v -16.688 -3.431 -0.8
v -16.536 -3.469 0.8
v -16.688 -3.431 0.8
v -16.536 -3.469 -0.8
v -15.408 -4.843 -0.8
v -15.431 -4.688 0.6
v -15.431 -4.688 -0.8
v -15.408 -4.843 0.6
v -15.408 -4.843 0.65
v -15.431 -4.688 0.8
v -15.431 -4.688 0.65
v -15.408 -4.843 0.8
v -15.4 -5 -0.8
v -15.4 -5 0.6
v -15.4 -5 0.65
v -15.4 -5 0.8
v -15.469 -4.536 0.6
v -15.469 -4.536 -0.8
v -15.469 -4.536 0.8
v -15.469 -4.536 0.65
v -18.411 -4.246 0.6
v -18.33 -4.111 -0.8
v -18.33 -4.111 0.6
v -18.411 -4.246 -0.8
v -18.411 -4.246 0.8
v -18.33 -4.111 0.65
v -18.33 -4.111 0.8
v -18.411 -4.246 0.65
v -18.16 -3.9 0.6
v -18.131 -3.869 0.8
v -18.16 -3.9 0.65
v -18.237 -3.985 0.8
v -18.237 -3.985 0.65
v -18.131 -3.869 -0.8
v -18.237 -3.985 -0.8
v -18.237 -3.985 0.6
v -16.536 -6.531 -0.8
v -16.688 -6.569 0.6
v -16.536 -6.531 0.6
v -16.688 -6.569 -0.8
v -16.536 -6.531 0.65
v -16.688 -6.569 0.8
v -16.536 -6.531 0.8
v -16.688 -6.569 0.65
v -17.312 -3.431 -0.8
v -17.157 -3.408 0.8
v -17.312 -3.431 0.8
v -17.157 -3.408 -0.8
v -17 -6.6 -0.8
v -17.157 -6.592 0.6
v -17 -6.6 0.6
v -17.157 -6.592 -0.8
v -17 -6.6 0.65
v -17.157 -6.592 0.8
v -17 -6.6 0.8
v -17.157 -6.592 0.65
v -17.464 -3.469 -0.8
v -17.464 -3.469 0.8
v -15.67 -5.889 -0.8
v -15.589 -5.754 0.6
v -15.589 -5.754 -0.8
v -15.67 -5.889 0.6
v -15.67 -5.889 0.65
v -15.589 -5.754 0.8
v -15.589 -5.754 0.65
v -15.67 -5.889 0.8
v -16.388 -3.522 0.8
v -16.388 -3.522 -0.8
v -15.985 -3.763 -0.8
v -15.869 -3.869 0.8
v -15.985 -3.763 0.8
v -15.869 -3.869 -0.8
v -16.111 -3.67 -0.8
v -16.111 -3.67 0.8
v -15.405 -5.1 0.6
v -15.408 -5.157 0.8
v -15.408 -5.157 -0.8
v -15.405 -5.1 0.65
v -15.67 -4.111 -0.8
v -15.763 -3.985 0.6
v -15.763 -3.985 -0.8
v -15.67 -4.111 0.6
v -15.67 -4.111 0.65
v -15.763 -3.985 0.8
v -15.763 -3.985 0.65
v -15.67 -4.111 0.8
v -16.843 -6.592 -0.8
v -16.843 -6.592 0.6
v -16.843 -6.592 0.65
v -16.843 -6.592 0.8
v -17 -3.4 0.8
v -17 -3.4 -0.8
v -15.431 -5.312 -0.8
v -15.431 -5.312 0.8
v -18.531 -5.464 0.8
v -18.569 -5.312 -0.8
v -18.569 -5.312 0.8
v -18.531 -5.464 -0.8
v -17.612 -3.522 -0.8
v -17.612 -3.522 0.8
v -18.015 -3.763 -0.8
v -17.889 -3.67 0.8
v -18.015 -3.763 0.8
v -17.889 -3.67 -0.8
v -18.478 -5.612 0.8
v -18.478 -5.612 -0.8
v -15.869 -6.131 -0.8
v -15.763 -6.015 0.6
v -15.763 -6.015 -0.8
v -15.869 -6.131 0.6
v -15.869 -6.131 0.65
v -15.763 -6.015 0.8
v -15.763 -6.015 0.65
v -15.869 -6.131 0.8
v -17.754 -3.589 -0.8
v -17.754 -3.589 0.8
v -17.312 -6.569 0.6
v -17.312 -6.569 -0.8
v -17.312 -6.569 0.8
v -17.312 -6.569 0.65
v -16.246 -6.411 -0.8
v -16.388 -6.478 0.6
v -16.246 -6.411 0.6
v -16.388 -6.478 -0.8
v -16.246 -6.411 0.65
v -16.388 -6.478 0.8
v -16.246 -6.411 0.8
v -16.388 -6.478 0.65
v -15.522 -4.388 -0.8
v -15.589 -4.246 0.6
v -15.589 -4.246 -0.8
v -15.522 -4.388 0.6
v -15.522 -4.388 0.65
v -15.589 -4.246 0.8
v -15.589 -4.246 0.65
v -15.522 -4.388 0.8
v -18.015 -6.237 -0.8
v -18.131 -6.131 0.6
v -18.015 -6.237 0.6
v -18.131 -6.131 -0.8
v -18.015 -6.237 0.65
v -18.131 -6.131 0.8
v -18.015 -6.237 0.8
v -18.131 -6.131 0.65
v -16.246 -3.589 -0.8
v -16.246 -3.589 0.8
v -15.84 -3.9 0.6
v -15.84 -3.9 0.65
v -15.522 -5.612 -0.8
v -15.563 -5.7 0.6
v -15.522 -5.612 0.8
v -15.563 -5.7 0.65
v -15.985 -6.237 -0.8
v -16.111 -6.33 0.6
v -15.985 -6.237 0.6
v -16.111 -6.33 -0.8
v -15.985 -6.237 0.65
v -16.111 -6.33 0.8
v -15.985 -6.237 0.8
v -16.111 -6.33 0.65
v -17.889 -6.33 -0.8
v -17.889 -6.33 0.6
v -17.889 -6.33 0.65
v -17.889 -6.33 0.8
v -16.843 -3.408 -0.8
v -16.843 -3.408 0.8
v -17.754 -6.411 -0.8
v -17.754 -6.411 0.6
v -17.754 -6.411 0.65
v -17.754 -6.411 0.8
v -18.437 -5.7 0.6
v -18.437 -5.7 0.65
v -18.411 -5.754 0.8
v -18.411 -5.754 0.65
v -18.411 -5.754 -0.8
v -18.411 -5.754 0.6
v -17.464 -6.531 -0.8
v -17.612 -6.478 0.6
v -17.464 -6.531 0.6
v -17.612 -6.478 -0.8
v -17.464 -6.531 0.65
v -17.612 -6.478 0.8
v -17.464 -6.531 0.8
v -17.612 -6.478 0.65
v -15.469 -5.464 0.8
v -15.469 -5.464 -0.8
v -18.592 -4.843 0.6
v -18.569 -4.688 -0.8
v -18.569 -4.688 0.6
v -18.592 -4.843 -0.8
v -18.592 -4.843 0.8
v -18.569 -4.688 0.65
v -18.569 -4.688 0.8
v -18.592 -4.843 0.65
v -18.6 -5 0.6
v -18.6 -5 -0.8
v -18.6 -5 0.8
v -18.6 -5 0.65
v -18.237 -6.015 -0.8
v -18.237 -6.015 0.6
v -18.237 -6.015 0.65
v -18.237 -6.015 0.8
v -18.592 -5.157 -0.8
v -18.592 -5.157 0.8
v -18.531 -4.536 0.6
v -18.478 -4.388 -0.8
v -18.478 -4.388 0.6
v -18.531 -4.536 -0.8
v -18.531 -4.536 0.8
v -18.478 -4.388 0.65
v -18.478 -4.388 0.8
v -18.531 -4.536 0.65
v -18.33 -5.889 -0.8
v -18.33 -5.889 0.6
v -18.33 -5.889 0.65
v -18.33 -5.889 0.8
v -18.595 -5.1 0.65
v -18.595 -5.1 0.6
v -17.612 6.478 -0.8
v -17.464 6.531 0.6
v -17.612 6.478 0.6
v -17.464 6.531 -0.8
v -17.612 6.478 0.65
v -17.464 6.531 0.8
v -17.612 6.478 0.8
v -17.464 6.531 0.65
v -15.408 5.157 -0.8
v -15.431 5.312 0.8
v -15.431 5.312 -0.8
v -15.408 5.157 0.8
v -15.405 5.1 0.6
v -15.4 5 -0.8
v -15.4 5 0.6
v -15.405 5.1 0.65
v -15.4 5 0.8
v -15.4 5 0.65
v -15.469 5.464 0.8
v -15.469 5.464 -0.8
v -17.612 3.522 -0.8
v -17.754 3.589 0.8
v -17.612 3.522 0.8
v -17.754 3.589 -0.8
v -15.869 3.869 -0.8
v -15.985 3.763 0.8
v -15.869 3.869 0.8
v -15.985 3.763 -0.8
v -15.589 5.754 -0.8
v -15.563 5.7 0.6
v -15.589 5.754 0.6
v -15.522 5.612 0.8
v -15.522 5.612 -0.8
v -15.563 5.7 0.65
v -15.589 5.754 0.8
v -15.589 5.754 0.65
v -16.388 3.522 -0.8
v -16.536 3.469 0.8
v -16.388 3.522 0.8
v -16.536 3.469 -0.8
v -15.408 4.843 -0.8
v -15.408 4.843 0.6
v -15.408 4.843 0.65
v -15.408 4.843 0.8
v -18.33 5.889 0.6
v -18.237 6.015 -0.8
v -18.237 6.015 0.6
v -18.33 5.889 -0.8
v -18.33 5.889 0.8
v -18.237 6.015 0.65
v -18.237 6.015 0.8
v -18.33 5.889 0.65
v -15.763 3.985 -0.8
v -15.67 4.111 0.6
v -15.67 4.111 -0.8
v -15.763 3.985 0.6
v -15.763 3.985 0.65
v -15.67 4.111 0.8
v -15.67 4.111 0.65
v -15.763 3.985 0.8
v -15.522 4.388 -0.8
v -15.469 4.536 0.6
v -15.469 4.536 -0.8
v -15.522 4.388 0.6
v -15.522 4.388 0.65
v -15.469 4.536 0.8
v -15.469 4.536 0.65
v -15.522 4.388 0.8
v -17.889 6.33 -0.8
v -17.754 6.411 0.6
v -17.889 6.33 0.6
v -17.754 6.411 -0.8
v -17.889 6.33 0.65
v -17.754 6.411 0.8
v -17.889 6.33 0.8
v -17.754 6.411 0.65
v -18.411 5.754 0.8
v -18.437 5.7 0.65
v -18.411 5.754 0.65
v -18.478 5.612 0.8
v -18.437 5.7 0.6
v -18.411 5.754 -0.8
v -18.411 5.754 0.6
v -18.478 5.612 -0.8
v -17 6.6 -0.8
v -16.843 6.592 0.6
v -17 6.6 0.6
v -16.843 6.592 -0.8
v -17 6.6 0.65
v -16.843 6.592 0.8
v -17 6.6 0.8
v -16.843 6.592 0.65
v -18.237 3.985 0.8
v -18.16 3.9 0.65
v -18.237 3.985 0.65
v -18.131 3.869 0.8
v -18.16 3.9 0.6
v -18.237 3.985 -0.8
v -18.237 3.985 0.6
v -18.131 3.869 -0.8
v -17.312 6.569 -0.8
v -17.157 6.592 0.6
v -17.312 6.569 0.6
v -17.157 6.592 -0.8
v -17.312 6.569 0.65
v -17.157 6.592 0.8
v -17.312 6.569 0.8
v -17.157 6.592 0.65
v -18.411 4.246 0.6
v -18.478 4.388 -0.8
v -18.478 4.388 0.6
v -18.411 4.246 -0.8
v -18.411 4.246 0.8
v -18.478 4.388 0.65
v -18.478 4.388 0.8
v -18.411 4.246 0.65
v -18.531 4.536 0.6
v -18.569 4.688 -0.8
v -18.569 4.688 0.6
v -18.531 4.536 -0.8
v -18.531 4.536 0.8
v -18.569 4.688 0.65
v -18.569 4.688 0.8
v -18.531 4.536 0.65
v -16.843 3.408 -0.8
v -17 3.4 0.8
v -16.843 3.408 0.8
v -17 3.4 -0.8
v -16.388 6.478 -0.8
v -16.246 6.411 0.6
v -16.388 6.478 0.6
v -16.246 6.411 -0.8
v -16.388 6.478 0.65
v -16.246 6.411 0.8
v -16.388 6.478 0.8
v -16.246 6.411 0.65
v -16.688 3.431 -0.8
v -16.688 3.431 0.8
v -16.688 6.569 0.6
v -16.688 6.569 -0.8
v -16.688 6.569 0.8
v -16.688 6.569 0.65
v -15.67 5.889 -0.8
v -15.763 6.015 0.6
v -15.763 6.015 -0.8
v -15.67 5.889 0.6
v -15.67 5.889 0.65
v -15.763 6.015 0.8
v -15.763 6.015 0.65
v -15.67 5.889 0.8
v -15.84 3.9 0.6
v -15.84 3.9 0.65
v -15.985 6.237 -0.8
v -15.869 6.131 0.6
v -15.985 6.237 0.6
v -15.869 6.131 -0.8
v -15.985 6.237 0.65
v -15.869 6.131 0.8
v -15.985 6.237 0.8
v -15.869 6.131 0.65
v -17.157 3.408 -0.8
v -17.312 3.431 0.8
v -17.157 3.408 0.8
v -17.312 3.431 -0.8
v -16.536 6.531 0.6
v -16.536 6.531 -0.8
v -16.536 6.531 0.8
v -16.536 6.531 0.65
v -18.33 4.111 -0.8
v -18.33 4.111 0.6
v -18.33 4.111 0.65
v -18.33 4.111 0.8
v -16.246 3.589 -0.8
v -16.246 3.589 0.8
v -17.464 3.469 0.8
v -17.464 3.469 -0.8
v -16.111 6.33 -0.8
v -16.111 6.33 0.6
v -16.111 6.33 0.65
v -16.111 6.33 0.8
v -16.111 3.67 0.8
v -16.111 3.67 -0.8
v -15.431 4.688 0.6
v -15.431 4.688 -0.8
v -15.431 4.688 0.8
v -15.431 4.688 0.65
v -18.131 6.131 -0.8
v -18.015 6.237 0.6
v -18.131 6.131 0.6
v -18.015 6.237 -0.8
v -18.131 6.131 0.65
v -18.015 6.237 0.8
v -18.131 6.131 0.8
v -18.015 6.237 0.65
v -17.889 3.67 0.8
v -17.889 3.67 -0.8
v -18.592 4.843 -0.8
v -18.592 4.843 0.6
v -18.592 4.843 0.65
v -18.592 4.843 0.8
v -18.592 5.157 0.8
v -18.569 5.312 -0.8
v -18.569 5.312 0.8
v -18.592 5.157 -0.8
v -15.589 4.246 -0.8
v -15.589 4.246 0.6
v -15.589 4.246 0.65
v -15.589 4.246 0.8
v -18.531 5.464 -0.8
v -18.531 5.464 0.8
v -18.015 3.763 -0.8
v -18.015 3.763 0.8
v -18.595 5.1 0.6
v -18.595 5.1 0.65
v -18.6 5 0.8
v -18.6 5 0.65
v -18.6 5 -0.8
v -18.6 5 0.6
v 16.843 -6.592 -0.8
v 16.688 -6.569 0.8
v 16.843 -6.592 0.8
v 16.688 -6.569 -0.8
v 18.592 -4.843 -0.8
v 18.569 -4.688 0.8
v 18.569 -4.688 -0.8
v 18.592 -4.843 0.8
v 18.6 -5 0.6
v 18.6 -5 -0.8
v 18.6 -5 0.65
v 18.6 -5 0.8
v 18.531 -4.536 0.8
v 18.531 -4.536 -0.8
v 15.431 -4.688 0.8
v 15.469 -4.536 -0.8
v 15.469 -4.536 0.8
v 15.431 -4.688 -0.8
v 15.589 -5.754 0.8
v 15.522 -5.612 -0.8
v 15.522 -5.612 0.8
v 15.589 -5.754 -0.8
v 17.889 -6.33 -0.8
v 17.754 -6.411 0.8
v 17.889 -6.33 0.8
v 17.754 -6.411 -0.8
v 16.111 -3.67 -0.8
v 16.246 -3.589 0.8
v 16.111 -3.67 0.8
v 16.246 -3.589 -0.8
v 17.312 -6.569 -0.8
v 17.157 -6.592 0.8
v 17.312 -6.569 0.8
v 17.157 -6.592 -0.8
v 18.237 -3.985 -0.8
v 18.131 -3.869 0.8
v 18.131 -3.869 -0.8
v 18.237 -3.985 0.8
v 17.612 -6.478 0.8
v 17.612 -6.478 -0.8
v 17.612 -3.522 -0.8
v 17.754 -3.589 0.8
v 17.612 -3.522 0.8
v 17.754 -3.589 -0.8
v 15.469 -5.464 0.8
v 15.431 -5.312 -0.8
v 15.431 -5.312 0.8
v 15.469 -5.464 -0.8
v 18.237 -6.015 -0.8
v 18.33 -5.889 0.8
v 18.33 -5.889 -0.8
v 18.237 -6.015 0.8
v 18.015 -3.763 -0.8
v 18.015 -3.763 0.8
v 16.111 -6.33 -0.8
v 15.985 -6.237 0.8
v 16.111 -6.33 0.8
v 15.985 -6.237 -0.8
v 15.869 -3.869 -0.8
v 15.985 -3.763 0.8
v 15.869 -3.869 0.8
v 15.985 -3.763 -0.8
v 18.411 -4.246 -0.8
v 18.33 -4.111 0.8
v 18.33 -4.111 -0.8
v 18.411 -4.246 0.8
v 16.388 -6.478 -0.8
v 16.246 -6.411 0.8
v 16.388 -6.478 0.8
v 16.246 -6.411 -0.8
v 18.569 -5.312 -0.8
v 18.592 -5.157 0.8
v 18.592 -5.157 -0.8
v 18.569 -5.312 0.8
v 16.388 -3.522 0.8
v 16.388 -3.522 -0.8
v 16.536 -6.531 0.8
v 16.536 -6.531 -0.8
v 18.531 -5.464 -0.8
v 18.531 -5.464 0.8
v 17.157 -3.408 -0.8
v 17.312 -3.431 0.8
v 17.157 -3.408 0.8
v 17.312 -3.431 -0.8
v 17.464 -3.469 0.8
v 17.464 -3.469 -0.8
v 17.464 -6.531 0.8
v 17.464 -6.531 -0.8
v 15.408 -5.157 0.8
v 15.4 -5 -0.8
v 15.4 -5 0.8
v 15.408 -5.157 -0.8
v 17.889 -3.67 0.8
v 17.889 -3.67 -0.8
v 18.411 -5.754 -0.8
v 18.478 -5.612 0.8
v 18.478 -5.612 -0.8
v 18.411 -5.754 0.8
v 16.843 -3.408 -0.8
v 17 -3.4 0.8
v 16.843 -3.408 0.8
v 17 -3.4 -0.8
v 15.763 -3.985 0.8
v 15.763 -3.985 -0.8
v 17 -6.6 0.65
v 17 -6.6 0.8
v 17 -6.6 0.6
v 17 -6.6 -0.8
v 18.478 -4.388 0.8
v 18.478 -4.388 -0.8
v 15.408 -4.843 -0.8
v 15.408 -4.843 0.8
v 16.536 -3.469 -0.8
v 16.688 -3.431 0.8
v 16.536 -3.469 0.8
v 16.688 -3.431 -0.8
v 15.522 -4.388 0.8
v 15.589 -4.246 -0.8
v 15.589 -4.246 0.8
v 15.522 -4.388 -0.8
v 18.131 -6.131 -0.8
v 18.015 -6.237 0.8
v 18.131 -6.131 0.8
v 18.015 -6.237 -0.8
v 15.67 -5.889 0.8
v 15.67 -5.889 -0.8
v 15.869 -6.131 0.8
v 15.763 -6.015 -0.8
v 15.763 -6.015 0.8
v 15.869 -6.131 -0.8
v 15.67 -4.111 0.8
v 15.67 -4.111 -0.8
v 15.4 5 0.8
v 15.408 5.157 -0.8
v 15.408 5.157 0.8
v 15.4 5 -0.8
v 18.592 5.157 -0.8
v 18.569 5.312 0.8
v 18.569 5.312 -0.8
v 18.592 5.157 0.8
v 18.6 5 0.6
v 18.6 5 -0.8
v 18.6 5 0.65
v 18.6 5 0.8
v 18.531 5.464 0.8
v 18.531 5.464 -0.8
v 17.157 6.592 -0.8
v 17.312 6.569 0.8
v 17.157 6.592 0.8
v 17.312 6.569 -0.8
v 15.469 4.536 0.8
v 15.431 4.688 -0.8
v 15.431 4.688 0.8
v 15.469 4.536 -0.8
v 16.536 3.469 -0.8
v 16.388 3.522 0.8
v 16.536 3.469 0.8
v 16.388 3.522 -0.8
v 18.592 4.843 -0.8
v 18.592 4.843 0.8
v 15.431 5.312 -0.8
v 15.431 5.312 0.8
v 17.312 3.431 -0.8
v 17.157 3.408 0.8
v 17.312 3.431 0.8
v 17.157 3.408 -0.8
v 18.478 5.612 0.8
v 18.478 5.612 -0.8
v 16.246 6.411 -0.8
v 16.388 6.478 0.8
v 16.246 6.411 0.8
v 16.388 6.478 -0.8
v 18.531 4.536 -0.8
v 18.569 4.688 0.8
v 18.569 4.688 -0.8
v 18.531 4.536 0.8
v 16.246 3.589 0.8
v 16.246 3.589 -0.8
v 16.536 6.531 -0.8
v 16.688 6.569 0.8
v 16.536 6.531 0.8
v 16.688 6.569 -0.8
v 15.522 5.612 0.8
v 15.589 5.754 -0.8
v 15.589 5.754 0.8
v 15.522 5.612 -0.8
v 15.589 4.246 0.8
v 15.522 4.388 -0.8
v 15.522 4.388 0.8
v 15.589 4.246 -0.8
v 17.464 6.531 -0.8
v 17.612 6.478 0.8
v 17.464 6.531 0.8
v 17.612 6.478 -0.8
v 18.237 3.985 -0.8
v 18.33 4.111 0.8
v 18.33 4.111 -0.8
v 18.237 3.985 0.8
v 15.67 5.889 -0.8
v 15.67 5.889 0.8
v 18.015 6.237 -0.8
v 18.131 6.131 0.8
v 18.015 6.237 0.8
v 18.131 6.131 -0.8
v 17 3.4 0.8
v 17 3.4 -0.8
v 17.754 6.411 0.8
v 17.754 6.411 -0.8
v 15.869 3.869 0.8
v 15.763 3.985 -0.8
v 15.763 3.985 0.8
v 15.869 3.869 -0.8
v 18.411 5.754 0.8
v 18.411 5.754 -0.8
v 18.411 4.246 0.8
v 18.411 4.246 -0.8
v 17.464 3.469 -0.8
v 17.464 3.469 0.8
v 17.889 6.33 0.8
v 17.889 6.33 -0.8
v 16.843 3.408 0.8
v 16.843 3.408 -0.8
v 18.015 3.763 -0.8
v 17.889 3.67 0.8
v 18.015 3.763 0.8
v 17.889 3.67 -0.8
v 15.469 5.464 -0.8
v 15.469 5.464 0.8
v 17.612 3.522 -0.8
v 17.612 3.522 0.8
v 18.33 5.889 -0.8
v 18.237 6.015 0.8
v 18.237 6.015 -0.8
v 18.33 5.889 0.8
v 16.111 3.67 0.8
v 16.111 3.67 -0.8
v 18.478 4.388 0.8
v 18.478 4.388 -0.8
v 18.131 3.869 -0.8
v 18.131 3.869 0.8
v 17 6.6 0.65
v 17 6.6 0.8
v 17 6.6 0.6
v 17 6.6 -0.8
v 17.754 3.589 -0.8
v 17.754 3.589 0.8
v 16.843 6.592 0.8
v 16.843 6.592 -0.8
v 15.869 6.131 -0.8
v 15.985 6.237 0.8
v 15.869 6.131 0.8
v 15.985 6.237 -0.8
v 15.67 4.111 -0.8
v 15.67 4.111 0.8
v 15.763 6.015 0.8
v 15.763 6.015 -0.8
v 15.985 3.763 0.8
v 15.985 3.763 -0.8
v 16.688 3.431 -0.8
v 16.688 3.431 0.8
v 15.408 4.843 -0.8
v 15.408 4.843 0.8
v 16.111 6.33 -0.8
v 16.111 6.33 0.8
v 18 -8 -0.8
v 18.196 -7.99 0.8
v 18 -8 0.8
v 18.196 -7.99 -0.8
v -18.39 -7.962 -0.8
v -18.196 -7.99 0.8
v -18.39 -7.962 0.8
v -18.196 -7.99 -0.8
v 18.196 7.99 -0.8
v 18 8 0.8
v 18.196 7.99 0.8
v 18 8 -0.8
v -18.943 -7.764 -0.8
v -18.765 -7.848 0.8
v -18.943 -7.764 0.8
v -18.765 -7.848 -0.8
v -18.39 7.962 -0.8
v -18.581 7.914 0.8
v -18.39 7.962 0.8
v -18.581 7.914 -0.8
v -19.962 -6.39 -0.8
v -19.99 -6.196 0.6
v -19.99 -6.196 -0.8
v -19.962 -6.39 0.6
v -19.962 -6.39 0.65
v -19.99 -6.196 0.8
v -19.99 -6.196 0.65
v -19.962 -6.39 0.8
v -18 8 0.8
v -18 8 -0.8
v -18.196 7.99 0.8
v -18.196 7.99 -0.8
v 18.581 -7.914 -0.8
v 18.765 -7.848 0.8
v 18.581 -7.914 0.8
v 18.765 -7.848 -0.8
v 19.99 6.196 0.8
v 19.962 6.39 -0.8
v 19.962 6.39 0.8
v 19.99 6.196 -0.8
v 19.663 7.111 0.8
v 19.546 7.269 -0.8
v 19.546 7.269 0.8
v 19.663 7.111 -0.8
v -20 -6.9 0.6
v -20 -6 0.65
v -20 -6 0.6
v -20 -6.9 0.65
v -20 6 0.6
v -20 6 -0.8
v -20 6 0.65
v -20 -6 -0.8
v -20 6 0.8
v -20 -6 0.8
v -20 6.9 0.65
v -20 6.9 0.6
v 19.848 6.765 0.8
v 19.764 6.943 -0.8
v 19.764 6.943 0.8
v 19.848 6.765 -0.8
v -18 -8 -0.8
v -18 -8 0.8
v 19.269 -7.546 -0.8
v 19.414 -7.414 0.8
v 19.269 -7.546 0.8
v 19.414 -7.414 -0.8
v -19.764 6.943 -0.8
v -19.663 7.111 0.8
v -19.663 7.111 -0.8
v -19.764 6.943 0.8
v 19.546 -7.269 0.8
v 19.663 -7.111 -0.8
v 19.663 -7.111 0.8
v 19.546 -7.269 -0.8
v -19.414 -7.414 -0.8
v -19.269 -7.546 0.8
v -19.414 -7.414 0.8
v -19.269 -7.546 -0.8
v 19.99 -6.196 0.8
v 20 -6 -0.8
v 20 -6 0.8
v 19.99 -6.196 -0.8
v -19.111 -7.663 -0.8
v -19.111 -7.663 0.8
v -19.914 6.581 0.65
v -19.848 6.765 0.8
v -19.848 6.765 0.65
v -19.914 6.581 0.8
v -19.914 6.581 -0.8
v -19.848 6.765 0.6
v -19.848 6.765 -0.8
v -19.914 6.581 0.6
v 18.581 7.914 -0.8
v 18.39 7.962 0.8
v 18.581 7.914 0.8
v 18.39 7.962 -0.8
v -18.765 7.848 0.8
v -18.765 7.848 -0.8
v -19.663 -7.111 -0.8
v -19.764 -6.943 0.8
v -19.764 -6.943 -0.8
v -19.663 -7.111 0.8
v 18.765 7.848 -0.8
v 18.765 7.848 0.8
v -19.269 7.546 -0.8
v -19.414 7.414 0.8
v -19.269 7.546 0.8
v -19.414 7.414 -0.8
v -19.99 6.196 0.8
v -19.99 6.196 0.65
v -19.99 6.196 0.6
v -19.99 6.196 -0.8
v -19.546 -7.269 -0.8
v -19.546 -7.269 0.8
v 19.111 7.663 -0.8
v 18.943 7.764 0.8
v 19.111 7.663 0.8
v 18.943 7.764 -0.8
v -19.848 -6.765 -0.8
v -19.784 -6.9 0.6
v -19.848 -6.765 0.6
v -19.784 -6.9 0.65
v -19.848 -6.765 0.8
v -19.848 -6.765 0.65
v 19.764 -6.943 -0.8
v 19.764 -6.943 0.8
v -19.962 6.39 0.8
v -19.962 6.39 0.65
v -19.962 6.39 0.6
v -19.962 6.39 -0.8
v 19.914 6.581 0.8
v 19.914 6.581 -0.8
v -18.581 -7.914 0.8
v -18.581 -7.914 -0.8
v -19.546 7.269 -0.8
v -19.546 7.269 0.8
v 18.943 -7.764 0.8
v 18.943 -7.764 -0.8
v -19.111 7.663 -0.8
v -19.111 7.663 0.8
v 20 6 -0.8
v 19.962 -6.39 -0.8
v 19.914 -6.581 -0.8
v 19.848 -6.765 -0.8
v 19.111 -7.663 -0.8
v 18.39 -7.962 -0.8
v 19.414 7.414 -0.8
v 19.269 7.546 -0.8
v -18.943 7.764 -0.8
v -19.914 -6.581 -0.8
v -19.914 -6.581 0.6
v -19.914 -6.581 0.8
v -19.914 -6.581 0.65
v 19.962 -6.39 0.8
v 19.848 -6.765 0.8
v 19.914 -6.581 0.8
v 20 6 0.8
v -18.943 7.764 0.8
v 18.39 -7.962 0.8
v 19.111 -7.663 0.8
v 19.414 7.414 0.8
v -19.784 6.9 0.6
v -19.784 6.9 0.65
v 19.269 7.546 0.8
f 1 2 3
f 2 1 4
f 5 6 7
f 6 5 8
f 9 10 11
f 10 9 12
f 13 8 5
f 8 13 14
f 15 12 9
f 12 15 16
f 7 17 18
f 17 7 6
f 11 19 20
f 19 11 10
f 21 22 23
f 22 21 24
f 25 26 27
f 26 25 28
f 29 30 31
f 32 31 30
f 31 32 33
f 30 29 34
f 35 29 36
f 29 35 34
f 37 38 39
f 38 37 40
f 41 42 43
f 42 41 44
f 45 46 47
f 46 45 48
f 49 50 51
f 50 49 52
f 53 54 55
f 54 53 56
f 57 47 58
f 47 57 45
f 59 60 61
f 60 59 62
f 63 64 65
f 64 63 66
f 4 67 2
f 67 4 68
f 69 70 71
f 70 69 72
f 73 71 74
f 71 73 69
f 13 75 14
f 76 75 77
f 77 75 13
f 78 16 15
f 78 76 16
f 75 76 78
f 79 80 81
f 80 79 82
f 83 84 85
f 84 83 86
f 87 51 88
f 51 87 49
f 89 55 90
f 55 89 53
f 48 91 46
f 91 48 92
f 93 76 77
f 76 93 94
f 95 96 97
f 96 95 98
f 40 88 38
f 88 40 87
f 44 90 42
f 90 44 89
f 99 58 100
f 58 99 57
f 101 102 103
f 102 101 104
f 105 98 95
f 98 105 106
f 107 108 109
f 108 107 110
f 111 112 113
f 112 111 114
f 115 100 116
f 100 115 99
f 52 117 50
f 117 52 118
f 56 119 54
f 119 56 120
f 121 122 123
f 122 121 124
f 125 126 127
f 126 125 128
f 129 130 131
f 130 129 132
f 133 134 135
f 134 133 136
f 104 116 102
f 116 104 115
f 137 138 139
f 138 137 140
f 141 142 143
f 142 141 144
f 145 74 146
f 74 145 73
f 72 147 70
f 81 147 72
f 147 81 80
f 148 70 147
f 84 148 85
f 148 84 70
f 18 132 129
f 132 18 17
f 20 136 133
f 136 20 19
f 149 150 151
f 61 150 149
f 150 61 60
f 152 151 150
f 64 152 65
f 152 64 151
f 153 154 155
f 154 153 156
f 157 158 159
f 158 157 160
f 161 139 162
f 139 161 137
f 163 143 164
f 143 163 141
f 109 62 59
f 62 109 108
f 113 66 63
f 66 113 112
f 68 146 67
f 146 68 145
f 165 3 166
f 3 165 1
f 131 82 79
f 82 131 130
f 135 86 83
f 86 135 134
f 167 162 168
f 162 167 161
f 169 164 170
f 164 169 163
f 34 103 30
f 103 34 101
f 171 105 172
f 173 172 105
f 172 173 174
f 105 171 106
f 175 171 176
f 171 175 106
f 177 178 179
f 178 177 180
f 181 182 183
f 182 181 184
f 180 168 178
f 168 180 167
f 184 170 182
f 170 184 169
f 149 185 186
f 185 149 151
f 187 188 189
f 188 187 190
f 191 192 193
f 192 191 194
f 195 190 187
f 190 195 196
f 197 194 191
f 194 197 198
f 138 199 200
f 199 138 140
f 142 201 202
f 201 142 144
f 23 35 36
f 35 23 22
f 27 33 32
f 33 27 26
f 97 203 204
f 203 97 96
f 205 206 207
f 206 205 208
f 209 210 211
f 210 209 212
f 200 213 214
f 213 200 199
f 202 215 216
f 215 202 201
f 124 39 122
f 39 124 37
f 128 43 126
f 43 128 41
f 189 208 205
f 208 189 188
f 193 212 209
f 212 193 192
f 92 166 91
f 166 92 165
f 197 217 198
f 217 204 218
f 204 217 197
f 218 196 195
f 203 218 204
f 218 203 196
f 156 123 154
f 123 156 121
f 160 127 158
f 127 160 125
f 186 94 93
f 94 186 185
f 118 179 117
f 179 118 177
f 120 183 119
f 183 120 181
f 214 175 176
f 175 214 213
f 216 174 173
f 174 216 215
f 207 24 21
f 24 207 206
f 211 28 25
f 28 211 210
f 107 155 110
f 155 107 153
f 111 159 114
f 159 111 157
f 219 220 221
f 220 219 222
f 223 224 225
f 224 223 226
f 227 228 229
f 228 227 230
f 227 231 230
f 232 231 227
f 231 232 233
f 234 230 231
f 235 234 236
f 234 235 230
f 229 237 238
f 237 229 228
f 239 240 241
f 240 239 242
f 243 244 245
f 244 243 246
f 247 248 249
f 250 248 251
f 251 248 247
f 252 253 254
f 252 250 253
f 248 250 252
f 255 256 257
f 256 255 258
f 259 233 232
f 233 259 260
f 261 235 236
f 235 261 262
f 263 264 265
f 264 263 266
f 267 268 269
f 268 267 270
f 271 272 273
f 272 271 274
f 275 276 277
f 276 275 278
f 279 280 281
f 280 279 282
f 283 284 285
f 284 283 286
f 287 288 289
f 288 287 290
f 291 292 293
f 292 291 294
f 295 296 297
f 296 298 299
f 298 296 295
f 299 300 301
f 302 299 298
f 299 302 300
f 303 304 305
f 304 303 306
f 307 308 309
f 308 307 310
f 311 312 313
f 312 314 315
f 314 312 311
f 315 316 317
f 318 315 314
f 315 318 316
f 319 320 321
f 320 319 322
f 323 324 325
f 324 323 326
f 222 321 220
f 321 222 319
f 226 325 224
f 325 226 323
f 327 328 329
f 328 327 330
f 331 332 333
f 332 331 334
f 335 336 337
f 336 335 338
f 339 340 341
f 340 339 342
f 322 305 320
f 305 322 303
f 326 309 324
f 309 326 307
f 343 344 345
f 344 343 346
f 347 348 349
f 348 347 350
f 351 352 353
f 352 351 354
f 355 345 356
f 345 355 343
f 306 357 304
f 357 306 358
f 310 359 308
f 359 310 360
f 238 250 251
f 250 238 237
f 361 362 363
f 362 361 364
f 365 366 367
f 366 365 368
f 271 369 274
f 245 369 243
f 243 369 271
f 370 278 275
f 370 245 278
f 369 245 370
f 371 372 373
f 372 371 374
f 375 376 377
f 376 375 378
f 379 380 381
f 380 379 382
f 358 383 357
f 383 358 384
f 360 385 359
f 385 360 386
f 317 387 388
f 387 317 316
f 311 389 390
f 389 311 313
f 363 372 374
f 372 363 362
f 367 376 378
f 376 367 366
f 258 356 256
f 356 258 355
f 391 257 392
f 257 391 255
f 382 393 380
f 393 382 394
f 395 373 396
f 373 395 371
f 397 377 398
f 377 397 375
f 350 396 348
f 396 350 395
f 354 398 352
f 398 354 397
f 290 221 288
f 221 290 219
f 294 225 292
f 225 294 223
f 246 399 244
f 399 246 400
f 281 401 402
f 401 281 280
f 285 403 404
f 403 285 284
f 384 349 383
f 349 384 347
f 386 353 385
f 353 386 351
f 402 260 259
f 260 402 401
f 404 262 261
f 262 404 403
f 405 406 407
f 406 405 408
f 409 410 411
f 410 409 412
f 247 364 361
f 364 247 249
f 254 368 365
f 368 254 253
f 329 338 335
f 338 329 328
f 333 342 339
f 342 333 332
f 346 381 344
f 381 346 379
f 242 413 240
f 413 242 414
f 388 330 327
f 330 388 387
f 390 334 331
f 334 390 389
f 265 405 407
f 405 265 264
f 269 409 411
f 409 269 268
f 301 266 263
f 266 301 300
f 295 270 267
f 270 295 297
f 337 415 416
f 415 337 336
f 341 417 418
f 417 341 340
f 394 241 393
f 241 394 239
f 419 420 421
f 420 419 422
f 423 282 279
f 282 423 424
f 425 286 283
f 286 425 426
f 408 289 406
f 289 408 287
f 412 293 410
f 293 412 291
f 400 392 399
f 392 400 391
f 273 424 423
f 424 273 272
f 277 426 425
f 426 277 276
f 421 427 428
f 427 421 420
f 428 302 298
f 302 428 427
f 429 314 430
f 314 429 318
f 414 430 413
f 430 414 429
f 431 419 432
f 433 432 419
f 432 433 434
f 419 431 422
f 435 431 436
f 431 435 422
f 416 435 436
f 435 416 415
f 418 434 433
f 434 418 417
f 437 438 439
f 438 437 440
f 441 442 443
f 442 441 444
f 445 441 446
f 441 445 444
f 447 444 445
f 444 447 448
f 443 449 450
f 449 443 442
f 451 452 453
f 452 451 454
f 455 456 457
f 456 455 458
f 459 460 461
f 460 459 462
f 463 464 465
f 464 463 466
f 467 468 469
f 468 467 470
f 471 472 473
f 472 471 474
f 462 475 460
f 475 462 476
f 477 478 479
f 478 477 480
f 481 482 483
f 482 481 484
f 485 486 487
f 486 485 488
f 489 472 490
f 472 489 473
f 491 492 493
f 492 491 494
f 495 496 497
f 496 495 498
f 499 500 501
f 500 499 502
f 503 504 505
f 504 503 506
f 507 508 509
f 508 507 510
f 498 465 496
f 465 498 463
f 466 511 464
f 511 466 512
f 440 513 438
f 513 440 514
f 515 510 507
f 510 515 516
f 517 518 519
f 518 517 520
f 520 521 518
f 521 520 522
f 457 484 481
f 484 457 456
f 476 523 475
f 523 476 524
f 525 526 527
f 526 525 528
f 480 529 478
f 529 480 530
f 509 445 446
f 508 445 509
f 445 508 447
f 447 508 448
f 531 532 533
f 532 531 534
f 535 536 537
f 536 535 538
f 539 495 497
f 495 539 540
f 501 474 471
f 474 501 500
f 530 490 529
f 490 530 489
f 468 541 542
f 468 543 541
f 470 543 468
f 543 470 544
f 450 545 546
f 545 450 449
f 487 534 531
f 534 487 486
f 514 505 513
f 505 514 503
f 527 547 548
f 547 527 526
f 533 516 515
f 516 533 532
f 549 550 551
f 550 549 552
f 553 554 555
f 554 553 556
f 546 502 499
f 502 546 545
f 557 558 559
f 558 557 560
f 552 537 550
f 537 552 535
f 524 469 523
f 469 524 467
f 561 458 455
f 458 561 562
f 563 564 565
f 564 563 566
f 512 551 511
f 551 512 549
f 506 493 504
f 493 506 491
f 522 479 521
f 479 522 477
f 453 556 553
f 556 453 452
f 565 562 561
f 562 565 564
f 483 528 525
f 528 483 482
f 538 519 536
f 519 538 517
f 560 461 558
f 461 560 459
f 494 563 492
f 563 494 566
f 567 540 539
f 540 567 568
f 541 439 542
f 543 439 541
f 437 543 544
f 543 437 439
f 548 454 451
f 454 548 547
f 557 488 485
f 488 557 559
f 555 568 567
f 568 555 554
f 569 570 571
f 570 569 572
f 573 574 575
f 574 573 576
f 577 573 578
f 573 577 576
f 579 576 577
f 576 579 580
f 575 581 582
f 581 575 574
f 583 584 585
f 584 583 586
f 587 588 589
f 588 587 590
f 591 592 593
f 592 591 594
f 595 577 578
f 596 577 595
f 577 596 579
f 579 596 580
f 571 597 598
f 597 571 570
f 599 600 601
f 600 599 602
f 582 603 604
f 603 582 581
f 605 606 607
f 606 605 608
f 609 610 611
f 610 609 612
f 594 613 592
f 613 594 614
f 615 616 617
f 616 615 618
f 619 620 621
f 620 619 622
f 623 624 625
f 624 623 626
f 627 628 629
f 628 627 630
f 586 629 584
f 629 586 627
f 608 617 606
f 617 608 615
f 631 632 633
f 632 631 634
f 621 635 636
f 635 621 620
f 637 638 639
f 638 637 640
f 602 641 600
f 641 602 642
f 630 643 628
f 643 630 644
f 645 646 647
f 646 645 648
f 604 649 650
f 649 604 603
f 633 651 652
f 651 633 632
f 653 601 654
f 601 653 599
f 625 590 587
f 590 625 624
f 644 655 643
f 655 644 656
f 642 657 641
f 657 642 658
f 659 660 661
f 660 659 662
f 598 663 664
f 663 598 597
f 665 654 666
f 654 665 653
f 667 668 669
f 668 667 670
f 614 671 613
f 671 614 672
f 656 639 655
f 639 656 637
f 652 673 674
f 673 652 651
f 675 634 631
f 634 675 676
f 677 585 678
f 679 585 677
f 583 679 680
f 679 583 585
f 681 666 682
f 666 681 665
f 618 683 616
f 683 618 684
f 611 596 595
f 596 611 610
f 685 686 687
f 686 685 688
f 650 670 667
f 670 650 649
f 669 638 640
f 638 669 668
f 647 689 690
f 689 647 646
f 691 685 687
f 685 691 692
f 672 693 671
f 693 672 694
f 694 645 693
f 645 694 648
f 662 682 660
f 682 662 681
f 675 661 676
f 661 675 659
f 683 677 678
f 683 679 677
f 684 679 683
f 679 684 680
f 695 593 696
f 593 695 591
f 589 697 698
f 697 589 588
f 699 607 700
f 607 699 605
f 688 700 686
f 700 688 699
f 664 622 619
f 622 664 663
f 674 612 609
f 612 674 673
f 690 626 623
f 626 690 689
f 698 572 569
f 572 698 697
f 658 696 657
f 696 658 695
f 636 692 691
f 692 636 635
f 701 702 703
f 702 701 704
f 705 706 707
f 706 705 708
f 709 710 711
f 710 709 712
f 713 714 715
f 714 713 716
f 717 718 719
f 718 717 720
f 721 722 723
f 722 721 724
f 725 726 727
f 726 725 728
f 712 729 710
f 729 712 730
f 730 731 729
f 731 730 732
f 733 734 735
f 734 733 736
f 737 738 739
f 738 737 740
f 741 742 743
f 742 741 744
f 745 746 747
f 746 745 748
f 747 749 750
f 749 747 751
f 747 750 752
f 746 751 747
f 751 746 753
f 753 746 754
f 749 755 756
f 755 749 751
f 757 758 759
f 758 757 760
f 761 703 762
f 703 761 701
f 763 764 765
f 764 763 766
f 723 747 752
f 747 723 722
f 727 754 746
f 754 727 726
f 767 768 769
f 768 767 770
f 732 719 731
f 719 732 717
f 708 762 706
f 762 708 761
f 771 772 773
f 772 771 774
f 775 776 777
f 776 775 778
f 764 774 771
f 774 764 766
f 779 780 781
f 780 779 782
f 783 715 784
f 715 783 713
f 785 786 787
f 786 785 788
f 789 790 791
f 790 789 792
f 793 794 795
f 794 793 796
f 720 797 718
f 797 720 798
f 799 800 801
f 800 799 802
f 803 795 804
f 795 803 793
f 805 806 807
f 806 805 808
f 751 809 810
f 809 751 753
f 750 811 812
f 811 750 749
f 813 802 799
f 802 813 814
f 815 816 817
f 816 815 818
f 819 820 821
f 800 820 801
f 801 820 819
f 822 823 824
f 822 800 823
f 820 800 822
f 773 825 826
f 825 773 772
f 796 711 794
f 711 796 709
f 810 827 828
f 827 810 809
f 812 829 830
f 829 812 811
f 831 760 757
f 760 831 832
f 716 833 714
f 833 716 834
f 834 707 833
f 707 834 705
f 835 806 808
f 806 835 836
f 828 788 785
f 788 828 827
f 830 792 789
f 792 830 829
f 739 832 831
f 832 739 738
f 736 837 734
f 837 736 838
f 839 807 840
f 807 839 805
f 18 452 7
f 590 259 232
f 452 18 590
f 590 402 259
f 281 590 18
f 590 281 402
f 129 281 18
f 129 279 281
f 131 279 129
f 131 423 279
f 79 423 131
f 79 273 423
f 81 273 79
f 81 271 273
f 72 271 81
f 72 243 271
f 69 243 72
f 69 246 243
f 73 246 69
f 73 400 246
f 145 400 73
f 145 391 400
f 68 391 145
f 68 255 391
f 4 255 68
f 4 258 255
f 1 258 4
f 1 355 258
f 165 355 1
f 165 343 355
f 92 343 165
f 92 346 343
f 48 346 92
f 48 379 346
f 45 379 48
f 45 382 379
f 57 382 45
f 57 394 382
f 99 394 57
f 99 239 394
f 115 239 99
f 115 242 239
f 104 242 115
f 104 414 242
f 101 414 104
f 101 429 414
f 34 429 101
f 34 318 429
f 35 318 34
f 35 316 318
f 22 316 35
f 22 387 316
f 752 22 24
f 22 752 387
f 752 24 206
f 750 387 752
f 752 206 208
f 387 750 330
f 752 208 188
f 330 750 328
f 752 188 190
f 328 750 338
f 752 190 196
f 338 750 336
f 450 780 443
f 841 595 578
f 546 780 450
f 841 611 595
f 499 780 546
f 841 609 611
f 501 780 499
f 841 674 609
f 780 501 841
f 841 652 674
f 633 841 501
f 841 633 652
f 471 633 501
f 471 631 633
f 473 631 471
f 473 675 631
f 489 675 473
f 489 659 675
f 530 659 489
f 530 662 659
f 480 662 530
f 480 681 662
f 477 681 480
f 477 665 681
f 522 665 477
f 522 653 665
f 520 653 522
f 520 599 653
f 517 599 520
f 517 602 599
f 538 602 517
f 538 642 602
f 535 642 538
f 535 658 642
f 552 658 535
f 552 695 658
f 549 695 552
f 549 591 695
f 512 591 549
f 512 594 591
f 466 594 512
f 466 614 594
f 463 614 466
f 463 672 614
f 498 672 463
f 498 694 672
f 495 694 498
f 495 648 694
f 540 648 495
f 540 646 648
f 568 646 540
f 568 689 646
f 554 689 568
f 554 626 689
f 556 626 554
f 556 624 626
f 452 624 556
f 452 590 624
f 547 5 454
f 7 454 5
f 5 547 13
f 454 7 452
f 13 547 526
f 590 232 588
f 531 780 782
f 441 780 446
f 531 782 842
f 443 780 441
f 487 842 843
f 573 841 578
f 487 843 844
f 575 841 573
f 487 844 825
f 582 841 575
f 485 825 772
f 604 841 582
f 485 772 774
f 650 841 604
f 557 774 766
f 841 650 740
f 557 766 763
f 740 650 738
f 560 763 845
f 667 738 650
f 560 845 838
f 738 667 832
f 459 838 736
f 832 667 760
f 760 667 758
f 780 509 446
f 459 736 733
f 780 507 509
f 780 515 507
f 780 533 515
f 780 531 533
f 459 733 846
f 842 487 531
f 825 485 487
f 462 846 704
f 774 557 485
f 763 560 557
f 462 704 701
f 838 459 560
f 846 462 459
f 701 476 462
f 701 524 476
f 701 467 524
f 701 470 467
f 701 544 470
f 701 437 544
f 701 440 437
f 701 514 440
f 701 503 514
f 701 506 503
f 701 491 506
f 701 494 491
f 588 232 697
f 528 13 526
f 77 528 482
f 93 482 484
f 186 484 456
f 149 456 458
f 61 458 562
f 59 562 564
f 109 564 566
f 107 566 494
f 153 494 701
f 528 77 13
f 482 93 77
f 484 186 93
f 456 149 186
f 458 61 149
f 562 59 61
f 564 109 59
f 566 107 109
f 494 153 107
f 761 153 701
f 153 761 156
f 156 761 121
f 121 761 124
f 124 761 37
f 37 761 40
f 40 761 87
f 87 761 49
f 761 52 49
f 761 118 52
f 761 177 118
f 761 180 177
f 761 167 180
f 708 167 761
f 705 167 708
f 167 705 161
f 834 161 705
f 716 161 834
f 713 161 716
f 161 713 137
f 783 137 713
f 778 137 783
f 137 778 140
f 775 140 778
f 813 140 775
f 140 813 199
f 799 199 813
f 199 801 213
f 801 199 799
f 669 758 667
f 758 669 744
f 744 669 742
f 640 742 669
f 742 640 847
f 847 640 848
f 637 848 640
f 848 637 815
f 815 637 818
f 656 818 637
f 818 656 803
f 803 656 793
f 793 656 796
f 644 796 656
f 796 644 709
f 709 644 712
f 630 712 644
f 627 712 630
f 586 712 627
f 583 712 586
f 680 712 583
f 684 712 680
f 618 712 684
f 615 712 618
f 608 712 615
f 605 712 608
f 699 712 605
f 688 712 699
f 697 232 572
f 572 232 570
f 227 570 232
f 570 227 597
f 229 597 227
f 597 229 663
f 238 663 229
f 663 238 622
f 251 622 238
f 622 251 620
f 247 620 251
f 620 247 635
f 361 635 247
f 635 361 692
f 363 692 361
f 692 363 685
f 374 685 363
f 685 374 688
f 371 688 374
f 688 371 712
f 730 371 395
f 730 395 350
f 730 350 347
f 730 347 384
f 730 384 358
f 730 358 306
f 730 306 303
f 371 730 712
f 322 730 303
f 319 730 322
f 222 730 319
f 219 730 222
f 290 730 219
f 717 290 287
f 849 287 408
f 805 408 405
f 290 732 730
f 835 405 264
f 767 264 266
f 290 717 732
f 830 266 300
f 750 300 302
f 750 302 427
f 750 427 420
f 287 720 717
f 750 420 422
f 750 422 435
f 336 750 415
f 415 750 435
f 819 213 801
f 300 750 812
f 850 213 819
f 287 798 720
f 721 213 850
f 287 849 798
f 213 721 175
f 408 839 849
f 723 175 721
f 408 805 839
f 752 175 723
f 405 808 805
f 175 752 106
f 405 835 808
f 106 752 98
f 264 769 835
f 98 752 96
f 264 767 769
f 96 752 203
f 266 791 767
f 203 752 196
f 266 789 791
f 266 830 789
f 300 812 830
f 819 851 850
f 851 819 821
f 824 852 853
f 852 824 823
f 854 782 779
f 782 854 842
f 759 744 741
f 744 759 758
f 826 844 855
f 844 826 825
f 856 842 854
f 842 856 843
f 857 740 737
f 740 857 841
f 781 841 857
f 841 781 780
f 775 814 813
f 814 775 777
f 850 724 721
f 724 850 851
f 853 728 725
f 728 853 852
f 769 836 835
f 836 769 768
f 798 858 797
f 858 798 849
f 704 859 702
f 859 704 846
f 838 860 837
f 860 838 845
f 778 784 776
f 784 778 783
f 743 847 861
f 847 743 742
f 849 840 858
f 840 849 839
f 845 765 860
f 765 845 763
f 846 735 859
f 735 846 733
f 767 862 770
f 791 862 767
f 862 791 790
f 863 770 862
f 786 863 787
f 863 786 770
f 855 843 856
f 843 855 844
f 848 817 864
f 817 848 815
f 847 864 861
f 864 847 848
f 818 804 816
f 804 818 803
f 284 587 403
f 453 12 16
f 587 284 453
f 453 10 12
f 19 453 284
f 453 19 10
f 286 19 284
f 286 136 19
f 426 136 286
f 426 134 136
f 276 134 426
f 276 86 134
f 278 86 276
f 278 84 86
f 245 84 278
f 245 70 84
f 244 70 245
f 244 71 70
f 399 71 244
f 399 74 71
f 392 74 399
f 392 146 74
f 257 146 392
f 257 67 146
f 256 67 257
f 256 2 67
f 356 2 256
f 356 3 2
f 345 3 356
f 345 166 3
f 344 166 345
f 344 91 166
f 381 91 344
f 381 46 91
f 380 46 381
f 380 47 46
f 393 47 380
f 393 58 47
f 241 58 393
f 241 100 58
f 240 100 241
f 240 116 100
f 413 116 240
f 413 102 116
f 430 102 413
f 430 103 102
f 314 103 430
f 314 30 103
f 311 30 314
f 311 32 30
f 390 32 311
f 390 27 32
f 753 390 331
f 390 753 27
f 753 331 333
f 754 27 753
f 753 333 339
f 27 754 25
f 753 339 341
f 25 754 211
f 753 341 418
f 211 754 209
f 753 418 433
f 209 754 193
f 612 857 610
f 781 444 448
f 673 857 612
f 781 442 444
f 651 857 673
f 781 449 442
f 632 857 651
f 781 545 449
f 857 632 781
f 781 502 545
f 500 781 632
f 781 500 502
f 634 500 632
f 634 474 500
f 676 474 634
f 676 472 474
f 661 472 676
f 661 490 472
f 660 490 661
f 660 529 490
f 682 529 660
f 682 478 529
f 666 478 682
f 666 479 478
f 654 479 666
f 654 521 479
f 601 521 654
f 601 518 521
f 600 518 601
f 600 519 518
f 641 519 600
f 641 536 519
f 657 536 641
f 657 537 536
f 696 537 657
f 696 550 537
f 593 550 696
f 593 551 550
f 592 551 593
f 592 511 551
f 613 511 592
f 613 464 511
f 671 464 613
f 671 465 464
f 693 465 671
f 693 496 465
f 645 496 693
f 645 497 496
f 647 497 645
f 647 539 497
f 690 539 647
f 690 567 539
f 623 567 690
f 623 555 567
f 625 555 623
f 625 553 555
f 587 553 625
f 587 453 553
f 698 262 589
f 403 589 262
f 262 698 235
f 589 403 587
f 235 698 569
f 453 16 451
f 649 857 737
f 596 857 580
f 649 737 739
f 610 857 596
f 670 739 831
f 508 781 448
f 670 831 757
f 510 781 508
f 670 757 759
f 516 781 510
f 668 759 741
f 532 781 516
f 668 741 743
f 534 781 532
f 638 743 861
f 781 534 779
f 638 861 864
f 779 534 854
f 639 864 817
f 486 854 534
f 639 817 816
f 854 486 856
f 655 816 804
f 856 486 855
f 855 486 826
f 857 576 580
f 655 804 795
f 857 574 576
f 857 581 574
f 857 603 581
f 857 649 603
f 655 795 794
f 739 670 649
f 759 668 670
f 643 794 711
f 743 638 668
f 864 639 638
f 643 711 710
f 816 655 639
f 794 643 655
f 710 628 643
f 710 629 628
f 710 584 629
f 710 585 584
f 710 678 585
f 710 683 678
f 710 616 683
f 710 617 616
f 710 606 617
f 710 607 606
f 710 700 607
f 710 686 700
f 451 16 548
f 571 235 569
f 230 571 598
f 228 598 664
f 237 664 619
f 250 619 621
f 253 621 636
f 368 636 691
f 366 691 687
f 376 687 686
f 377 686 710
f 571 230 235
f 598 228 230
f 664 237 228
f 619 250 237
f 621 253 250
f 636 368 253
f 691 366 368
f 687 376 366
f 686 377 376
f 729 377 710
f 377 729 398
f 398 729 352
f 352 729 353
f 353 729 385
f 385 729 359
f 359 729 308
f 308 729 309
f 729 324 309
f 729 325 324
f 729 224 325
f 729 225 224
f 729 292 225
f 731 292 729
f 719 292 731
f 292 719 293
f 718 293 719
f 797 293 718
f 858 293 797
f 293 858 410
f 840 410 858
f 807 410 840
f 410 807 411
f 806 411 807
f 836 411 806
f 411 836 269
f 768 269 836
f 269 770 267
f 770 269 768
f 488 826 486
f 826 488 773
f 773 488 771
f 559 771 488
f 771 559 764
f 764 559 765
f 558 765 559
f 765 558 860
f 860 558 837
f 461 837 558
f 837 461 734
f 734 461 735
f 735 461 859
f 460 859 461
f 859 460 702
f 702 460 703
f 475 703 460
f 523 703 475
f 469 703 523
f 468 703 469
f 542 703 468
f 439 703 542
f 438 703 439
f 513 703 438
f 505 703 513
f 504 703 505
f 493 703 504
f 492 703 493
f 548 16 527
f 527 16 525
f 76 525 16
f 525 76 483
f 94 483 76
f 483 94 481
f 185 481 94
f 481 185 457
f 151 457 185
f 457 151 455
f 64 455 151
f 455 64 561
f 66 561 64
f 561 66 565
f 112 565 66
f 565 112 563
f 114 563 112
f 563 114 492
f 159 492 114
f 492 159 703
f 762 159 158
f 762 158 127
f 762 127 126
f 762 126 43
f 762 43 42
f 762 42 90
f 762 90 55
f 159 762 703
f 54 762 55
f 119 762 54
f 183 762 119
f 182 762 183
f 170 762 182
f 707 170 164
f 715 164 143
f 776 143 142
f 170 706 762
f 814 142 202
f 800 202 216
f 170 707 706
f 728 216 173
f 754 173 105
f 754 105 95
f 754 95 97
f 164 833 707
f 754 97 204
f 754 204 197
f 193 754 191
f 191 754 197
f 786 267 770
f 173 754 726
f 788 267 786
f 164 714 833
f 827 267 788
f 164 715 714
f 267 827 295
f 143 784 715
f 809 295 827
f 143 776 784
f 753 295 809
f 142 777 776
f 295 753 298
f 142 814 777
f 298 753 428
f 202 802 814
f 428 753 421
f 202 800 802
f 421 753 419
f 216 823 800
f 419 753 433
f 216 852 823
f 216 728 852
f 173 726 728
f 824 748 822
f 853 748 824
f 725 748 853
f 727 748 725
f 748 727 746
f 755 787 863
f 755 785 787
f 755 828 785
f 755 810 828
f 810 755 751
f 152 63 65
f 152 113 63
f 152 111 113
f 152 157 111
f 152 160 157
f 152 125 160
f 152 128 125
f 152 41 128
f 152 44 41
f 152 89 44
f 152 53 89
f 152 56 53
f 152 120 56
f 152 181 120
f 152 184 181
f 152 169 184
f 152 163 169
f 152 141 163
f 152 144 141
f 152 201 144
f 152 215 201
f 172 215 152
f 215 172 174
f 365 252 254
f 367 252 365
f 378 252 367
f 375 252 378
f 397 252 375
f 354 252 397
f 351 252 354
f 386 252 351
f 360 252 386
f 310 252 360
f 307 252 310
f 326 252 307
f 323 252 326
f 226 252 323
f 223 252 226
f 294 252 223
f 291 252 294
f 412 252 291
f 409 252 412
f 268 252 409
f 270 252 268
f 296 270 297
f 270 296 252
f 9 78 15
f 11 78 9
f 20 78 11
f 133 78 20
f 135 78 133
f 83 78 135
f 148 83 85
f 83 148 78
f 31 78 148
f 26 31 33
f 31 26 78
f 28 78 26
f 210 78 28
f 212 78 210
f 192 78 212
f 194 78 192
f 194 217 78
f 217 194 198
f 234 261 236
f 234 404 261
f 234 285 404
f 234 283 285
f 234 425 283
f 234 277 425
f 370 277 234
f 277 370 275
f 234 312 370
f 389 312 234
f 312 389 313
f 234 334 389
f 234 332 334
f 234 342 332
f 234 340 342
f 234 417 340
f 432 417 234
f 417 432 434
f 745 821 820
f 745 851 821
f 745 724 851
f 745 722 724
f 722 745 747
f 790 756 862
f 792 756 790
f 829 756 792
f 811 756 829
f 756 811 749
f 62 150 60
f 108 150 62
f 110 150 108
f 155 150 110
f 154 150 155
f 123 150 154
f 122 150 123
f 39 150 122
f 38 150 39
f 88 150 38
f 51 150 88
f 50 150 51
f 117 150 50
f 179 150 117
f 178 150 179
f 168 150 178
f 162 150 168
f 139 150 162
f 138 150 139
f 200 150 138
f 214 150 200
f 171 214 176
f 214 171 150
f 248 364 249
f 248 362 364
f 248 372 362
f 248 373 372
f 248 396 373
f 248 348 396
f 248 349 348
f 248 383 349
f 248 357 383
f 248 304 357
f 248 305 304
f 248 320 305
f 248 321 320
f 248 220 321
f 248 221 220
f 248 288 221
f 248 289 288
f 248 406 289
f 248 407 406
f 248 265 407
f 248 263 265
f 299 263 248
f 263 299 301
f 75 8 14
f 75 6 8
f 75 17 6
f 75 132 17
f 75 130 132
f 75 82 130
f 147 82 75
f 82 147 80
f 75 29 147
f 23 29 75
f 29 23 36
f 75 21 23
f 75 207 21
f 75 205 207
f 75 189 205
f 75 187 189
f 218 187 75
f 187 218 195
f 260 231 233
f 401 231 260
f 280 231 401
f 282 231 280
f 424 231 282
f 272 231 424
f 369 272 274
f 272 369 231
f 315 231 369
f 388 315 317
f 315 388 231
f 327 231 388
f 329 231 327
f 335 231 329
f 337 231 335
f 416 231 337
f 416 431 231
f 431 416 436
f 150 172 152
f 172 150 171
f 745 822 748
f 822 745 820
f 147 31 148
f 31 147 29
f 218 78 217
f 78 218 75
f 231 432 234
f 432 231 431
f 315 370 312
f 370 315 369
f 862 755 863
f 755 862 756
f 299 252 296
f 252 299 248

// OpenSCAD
// Printed Circuit Board (single connected solid)
// Exact overall size: 40.0mm x 16.0mm x 1.6mm

$fn = 64;

// Parameters
pcb_L = 40.0; //[20.0:80.0:0.5]
pcb_W = 16.0; //[8.0:32.0:0.5]
pcb_T = 1.6;  //[0.8:3.2:0.1]

corner_R = 2.0; //[1.0:4.0:0.25]

hole_D = 3.2; //[2.0:5.0:0.1]
hole_edge_margin = 3.0; //[1.5:6.0:0.25]

copper_T = 0.05; //[0.02:0.2:0.01]
silk_T   = 0.05; //[0.02:0.2:0.01]

// Small overlap to guarantee connectivity (no floating skins)
feature_overlap = 0.2; //[0.05:1.0:0.05]

pad_L = 2.0; //[1.0:4.0:0.25]
pad_W = 1.2; //[0.6:3.0:0.1]
trace_W = 0.6; //[0.2:2.0:0.05]
trace_L = 18.0; //[8.0:36.0:0.5]

silk_border_inset = 1.0; //[0.5:3.0:0.25]
silk_line_W = 0.4; //[0.2:1.0:0.05]

finger_count = 8; //[4:20:1]
finger_L = 6.0; //[3.0:12.0:0.5]
finger_W = 1.2; //[0.6:2.5:0.1]
finger_gap = 0.6; //[0.3:2.0:0.05]
finger_edge_inset = 1.0; //[0.5:3.0:0.25]

// Helpers
function clamp(x, a, b) = min(max(x, a), b);

// PCB Body with Rounded Corners (exact outer L/W, thickness pcb_T)
module pcb_body() {
  // Ensure corner radius is valid for given dimensions
  r = clamp(corner_R, 0, min(pcb_L, pcb_W)/2);

  difference() {
    // 2D rounded rectangle extruded to exact thickness
    linear_extrude(height = pcb_T, center = true, convexity = 10)
      offset(r = r)
        square([pcb_L - 2*r, pcb_W - 2*r], center = true);

    // Mounting holes (through)
    for (sx = [-1, 1], sy = [-1, 1]) {
      translate([sx*(pcb_L/2 - hole_edge_margin),
                 sy*(pcb_W/2 - hole_edge_margin),
                 0])
        cylinder(d = hole_D, h = pcb_T + 2*feature_overlap, center = true);
    }
  }
}

// Silkscreen Markings (merged into body via overlap)
module silkscreen_markings() {
  z = pcb_T/2 - feature_overlap + silk_T/2; // overlaps into PCB
  union() {
    translate([0,  pcb_W/2 - silk_border_inset - silk_line_W/2, z])
      cube([pcb_L - 2*silk_border_inset, silk_line_W, silk_T], center=true);
    translate([0, -pcb_W/2 + silk_border_inset + silk_line_W/2, z])
      cube([pcb_L - 2*silk_border_inset, silk_line_W, silk_T], center=true);
    translate([-pcb_L/2 + silk_border_inset + silk_line_W/2, 0, z])
      cube([silk_line_W, pcb_W - 2*silk_border_inset, silk_T], center=true);
    translate([ pcb_L/2 - silk_border_inset - silk_line_W/2, 0, z])
      cube([silk_line_W, pcb_W - 2*silk_border_inset, silk_T], center=true);
  }
}

// Copper Pads and Traces (merged into body via overlap)
module copper_pads_traces() {
  z = pcb_T/2 - feature_overlap + copper_T/2; // overlaps into PCB
  union() {
    translate([-pcb_L/4, 0, z]) cube([pad_L, pad_W, copper_T], center=true);
    translate([ pcb_L/4, 0, z]) cube([pad_L, pad_W, copper_T], center=true);
    translate([0, 0, z])        cube([trace_L, trace_W, copper_T], center=true);
  }
}

// Edge Connector Fingers (merged into body via overlap)
module edge_connector_fingers() {
  z = pcb_T/2 - feature_overlap + copper_T/2; // overlaps into PCB

  // Keep fingers within board width
  usable_W = pcb_W - 2*finger_edge_inset;
  pitch = finger_W + finger_gap;
  total_span = finger_count*finger_W + (finger_count-1)*finger_gap;
  start_y = -total_span/2 + finger_W/2;

  union() {
    for (i = [0:finger_count-1]) {
      y = start_y + i*pitch;
      // Only place if within usable area (prevents accidental out-of-bounds)
      if (abs(y) <= usable_W/2 + 1e-6)
        translate([-pcb_L/2 + finger_L/2, y, z])
          cube([finger_L, finger_W, copper_T], center=true);
    }
  }
}

// Complete PCB as ONE connected solid (no separate shells)
module pcb_complete() {
  union() {
    pcb_body();
    silkscreen_markings();
    copper_pads_traces();
    edge_connector_fingers();
  }
}

pcb_complete();
